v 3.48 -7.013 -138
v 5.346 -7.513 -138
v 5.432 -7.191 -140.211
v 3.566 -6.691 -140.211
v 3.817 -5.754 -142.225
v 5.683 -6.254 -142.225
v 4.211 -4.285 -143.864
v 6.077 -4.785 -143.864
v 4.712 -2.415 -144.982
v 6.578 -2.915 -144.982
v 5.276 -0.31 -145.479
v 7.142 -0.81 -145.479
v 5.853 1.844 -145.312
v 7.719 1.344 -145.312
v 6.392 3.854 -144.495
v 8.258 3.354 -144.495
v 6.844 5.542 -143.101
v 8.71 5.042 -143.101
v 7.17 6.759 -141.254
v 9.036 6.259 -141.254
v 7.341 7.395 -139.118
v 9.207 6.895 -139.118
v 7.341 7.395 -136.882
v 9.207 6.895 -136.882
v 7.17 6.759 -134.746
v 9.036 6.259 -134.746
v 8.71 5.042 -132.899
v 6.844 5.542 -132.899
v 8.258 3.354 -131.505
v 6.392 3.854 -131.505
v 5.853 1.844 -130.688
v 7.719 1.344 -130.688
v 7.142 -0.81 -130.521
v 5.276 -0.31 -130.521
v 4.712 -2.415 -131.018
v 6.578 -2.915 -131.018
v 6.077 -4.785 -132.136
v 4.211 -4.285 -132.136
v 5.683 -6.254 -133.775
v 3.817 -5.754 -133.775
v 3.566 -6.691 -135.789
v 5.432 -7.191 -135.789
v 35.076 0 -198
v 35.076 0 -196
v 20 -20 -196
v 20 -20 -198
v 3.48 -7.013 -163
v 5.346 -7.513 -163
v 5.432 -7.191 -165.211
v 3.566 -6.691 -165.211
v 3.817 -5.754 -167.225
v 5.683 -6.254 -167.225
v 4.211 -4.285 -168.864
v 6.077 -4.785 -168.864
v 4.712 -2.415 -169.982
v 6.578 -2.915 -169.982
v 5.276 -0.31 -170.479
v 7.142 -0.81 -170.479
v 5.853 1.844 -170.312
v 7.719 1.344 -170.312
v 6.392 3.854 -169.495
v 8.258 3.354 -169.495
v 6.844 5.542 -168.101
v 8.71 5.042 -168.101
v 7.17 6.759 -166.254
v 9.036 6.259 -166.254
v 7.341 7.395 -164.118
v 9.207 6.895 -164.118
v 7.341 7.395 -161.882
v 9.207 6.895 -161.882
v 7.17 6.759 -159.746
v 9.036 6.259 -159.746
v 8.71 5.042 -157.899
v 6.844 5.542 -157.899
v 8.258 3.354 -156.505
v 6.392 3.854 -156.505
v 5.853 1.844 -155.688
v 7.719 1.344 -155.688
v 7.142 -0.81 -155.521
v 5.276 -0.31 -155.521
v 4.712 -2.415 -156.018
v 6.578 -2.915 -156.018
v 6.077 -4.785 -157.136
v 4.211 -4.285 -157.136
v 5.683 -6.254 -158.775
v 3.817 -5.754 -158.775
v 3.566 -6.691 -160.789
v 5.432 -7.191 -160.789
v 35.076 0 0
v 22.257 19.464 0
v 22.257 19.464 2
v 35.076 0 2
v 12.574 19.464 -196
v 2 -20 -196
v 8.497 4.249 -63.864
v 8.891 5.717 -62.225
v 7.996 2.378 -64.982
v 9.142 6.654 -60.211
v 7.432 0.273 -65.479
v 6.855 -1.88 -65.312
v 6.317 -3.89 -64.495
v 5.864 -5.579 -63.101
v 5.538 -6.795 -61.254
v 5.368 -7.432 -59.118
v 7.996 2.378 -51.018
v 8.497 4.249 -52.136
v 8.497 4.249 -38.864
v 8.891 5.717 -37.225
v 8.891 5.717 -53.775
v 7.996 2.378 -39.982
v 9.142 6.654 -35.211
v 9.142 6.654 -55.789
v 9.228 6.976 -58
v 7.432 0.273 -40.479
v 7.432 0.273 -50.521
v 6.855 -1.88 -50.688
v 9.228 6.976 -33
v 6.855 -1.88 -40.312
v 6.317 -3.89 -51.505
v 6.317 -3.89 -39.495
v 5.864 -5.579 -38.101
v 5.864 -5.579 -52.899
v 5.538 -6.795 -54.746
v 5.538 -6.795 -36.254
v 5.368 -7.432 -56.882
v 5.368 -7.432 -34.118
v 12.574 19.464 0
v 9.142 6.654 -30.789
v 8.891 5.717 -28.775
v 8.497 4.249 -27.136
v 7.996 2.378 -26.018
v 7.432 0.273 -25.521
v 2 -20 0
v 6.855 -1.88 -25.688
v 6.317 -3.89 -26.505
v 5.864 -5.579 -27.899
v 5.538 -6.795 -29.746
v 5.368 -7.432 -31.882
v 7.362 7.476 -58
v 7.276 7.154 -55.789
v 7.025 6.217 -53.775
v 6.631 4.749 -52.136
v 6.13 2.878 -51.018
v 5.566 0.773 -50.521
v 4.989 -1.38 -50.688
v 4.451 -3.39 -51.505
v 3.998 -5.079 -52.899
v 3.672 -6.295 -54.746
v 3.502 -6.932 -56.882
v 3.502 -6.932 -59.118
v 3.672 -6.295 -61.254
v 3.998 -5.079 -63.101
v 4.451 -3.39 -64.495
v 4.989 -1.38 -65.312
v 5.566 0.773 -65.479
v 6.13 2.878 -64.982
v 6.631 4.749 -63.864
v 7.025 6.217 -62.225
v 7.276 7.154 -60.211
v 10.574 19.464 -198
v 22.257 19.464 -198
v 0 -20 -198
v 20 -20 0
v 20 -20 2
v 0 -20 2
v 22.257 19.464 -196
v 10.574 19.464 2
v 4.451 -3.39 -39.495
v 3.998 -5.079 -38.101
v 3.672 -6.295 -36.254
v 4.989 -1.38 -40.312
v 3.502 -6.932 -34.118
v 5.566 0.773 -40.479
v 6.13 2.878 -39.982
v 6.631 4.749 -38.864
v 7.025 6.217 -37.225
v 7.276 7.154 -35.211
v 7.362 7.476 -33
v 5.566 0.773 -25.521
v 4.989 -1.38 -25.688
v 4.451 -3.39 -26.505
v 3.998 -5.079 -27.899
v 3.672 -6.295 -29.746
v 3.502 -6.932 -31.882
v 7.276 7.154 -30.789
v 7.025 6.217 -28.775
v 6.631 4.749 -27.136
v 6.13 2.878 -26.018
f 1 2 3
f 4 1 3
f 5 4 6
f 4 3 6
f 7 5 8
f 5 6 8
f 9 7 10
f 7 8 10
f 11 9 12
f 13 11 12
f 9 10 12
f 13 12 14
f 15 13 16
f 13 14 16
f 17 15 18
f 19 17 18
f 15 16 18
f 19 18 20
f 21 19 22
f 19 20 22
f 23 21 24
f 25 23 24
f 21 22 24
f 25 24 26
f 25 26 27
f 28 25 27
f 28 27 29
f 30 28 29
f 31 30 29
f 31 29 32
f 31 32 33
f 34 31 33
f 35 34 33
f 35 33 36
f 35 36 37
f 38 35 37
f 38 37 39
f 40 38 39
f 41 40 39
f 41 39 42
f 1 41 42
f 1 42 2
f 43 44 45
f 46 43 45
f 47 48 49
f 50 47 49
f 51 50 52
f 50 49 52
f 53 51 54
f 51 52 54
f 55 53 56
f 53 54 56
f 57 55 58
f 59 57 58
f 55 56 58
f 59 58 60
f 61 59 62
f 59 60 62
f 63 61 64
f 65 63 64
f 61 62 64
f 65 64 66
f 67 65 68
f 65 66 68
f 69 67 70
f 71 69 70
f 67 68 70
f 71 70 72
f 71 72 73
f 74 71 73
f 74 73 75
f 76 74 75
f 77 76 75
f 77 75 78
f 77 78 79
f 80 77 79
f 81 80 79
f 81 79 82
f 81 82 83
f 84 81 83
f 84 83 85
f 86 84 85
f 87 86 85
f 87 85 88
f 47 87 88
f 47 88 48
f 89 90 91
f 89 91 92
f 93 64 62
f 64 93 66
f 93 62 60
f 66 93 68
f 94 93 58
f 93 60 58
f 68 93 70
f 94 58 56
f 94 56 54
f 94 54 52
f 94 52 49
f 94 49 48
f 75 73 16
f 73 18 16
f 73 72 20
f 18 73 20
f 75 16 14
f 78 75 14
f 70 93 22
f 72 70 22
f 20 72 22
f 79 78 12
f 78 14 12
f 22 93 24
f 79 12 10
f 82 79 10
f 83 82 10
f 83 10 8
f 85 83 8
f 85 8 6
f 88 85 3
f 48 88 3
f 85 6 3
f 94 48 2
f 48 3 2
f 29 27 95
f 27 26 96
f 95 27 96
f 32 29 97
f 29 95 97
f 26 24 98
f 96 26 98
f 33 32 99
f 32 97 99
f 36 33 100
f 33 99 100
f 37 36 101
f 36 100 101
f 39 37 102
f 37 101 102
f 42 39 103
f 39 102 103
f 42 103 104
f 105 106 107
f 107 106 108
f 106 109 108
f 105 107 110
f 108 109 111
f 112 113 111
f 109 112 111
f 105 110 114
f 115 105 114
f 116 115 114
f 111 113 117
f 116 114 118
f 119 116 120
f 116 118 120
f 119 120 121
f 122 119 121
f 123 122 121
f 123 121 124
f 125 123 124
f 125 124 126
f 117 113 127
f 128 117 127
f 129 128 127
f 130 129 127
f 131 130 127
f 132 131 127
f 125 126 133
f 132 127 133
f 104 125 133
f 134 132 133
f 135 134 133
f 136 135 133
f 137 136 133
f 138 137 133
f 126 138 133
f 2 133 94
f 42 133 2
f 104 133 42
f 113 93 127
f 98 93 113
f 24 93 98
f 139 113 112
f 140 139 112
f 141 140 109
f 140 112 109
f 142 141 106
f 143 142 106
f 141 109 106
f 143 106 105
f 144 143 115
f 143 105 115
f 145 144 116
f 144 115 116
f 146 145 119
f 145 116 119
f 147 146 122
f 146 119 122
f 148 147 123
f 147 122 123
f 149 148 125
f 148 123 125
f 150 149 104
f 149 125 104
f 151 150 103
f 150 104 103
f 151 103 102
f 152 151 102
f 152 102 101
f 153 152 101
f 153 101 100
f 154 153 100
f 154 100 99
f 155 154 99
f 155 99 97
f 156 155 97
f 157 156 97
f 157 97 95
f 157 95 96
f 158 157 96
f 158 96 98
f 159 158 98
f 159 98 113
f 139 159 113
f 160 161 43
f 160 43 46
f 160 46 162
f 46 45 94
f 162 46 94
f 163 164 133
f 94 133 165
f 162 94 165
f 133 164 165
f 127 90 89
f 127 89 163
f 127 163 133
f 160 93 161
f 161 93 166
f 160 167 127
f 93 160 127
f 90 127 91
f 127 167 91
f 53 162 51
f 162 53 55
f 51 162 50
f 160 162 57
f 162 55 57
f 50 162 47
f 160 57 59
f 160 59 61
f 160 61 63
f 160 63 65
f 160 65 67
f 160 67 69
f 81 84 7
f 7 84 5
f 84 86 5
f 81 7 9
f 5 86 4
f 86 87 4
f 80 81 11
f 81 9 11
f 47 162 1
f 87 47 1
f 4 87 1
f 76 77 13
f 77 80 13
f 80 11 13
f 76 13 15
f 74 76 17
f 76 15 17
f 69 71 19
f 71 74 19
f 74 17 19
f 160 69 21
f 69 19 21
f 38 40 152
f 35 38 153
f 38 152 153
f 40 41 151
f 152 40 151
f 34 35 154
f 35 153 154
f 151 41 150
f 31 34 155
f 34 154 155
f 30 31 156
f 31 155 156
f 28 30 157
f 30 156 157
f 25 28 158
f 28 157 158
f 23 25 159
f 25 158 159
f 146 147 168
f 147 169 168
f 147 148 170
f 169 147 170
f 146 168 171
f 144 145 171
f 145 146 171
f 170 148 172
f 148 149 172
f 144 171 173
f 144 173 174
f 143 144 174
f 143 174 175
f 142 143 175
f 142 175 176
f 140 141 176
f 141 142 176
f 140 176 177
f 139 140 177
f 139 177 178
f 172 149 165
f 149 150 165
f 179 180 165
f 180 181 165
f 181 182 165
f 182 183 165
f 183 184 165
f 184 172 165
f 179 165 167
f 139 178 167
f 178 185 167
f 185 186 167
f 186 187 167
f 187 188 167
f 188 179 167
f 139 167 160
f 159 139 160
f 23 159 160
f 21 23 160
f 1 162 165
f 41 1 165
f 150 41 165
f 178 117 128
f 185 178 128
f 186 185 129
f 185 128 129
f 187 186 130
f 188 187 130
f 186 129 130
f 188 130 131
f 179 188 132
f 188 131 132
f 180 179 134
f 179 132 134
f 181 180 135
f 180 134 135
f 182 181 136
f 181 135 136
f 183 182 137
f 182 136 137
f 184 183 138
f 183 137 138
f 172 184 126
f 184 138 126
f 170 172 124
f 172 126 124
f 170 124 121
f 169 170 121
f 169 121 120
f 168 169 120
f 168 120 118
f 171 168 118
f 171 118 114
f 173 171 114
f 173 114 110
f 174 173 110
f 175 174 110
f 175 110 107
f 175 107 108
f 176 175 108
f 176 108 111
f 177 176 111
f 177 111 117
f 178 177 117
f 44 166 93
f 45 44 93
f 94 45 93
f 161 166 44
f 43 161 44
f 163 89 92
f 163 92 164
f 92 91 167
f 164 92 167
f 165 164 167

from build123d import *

# Parameters (mm, degrees)
BOSS_EXTRUDE1_DEPTH = 2
BOSS_EXTRUDE2_DEPTH = 200
SKETCH3_R           = 7.5
CUT_EXTRUDE1_DEPTH  = 200


with BuildPart() as part:
    # Sketch1 → Boss-Extrude1 (new body)
    with BuildSketch(Plane.XY):
        Polygon((10.574219011, 19.4635226), (22.256543634, 19.4635226), (35.076132829, 0), (20, -20), (0, -20), align=None)
    boss_extrude1 = extrude(amount=BOSS_EXTRUDE1_DEPTH)

    # Sketch2 → Boss-Extrude2 (add)
    with BuildSketch(Plane.XY.offset(2)):
        Polygon((10.574219011, 19.4635226), (12.574219011, 19.4635226), (2, -20), (0, -20), align=None)
    extrude(amount=-BOSS_EXTRUDE2_DEPTH)

    # Mirror1: Boss-Extrude1 across plane
    add(boss_extrude1.mirror(Plane.XY.offset(-98)))

    # Sketch3 → Cut-Extrude1 (cut)
    with BuildSketch(Plane(origin=(6.866025404, -1.839745962, 0), x_dir=(0, 0, -1), z_dir=(0.9659258262890692, -0.25881904510251774, 0))):
        with Locations(Location((58, 1.626944036, 0), (0, 0, 90))):
            Circle(SKETCH3_R)
        with Locations(Location((33, 1.626944036, 0), (0, 0, 90))):
            Circle(SKETCH3_R)
        with Locations(Location((163, 1.626944036, 0), (0, 0, 270))):
            Circle(SKETCH3_R)
        with Locations(Location((138, 1.626944036, 0), (0, 0, 270))):
            Circle(SKETCH3_R)
    extrude(amount=-CUT_EXTRUDE1_DEPTH, mode=Mode.SUBTRACT)


solid = part.part
